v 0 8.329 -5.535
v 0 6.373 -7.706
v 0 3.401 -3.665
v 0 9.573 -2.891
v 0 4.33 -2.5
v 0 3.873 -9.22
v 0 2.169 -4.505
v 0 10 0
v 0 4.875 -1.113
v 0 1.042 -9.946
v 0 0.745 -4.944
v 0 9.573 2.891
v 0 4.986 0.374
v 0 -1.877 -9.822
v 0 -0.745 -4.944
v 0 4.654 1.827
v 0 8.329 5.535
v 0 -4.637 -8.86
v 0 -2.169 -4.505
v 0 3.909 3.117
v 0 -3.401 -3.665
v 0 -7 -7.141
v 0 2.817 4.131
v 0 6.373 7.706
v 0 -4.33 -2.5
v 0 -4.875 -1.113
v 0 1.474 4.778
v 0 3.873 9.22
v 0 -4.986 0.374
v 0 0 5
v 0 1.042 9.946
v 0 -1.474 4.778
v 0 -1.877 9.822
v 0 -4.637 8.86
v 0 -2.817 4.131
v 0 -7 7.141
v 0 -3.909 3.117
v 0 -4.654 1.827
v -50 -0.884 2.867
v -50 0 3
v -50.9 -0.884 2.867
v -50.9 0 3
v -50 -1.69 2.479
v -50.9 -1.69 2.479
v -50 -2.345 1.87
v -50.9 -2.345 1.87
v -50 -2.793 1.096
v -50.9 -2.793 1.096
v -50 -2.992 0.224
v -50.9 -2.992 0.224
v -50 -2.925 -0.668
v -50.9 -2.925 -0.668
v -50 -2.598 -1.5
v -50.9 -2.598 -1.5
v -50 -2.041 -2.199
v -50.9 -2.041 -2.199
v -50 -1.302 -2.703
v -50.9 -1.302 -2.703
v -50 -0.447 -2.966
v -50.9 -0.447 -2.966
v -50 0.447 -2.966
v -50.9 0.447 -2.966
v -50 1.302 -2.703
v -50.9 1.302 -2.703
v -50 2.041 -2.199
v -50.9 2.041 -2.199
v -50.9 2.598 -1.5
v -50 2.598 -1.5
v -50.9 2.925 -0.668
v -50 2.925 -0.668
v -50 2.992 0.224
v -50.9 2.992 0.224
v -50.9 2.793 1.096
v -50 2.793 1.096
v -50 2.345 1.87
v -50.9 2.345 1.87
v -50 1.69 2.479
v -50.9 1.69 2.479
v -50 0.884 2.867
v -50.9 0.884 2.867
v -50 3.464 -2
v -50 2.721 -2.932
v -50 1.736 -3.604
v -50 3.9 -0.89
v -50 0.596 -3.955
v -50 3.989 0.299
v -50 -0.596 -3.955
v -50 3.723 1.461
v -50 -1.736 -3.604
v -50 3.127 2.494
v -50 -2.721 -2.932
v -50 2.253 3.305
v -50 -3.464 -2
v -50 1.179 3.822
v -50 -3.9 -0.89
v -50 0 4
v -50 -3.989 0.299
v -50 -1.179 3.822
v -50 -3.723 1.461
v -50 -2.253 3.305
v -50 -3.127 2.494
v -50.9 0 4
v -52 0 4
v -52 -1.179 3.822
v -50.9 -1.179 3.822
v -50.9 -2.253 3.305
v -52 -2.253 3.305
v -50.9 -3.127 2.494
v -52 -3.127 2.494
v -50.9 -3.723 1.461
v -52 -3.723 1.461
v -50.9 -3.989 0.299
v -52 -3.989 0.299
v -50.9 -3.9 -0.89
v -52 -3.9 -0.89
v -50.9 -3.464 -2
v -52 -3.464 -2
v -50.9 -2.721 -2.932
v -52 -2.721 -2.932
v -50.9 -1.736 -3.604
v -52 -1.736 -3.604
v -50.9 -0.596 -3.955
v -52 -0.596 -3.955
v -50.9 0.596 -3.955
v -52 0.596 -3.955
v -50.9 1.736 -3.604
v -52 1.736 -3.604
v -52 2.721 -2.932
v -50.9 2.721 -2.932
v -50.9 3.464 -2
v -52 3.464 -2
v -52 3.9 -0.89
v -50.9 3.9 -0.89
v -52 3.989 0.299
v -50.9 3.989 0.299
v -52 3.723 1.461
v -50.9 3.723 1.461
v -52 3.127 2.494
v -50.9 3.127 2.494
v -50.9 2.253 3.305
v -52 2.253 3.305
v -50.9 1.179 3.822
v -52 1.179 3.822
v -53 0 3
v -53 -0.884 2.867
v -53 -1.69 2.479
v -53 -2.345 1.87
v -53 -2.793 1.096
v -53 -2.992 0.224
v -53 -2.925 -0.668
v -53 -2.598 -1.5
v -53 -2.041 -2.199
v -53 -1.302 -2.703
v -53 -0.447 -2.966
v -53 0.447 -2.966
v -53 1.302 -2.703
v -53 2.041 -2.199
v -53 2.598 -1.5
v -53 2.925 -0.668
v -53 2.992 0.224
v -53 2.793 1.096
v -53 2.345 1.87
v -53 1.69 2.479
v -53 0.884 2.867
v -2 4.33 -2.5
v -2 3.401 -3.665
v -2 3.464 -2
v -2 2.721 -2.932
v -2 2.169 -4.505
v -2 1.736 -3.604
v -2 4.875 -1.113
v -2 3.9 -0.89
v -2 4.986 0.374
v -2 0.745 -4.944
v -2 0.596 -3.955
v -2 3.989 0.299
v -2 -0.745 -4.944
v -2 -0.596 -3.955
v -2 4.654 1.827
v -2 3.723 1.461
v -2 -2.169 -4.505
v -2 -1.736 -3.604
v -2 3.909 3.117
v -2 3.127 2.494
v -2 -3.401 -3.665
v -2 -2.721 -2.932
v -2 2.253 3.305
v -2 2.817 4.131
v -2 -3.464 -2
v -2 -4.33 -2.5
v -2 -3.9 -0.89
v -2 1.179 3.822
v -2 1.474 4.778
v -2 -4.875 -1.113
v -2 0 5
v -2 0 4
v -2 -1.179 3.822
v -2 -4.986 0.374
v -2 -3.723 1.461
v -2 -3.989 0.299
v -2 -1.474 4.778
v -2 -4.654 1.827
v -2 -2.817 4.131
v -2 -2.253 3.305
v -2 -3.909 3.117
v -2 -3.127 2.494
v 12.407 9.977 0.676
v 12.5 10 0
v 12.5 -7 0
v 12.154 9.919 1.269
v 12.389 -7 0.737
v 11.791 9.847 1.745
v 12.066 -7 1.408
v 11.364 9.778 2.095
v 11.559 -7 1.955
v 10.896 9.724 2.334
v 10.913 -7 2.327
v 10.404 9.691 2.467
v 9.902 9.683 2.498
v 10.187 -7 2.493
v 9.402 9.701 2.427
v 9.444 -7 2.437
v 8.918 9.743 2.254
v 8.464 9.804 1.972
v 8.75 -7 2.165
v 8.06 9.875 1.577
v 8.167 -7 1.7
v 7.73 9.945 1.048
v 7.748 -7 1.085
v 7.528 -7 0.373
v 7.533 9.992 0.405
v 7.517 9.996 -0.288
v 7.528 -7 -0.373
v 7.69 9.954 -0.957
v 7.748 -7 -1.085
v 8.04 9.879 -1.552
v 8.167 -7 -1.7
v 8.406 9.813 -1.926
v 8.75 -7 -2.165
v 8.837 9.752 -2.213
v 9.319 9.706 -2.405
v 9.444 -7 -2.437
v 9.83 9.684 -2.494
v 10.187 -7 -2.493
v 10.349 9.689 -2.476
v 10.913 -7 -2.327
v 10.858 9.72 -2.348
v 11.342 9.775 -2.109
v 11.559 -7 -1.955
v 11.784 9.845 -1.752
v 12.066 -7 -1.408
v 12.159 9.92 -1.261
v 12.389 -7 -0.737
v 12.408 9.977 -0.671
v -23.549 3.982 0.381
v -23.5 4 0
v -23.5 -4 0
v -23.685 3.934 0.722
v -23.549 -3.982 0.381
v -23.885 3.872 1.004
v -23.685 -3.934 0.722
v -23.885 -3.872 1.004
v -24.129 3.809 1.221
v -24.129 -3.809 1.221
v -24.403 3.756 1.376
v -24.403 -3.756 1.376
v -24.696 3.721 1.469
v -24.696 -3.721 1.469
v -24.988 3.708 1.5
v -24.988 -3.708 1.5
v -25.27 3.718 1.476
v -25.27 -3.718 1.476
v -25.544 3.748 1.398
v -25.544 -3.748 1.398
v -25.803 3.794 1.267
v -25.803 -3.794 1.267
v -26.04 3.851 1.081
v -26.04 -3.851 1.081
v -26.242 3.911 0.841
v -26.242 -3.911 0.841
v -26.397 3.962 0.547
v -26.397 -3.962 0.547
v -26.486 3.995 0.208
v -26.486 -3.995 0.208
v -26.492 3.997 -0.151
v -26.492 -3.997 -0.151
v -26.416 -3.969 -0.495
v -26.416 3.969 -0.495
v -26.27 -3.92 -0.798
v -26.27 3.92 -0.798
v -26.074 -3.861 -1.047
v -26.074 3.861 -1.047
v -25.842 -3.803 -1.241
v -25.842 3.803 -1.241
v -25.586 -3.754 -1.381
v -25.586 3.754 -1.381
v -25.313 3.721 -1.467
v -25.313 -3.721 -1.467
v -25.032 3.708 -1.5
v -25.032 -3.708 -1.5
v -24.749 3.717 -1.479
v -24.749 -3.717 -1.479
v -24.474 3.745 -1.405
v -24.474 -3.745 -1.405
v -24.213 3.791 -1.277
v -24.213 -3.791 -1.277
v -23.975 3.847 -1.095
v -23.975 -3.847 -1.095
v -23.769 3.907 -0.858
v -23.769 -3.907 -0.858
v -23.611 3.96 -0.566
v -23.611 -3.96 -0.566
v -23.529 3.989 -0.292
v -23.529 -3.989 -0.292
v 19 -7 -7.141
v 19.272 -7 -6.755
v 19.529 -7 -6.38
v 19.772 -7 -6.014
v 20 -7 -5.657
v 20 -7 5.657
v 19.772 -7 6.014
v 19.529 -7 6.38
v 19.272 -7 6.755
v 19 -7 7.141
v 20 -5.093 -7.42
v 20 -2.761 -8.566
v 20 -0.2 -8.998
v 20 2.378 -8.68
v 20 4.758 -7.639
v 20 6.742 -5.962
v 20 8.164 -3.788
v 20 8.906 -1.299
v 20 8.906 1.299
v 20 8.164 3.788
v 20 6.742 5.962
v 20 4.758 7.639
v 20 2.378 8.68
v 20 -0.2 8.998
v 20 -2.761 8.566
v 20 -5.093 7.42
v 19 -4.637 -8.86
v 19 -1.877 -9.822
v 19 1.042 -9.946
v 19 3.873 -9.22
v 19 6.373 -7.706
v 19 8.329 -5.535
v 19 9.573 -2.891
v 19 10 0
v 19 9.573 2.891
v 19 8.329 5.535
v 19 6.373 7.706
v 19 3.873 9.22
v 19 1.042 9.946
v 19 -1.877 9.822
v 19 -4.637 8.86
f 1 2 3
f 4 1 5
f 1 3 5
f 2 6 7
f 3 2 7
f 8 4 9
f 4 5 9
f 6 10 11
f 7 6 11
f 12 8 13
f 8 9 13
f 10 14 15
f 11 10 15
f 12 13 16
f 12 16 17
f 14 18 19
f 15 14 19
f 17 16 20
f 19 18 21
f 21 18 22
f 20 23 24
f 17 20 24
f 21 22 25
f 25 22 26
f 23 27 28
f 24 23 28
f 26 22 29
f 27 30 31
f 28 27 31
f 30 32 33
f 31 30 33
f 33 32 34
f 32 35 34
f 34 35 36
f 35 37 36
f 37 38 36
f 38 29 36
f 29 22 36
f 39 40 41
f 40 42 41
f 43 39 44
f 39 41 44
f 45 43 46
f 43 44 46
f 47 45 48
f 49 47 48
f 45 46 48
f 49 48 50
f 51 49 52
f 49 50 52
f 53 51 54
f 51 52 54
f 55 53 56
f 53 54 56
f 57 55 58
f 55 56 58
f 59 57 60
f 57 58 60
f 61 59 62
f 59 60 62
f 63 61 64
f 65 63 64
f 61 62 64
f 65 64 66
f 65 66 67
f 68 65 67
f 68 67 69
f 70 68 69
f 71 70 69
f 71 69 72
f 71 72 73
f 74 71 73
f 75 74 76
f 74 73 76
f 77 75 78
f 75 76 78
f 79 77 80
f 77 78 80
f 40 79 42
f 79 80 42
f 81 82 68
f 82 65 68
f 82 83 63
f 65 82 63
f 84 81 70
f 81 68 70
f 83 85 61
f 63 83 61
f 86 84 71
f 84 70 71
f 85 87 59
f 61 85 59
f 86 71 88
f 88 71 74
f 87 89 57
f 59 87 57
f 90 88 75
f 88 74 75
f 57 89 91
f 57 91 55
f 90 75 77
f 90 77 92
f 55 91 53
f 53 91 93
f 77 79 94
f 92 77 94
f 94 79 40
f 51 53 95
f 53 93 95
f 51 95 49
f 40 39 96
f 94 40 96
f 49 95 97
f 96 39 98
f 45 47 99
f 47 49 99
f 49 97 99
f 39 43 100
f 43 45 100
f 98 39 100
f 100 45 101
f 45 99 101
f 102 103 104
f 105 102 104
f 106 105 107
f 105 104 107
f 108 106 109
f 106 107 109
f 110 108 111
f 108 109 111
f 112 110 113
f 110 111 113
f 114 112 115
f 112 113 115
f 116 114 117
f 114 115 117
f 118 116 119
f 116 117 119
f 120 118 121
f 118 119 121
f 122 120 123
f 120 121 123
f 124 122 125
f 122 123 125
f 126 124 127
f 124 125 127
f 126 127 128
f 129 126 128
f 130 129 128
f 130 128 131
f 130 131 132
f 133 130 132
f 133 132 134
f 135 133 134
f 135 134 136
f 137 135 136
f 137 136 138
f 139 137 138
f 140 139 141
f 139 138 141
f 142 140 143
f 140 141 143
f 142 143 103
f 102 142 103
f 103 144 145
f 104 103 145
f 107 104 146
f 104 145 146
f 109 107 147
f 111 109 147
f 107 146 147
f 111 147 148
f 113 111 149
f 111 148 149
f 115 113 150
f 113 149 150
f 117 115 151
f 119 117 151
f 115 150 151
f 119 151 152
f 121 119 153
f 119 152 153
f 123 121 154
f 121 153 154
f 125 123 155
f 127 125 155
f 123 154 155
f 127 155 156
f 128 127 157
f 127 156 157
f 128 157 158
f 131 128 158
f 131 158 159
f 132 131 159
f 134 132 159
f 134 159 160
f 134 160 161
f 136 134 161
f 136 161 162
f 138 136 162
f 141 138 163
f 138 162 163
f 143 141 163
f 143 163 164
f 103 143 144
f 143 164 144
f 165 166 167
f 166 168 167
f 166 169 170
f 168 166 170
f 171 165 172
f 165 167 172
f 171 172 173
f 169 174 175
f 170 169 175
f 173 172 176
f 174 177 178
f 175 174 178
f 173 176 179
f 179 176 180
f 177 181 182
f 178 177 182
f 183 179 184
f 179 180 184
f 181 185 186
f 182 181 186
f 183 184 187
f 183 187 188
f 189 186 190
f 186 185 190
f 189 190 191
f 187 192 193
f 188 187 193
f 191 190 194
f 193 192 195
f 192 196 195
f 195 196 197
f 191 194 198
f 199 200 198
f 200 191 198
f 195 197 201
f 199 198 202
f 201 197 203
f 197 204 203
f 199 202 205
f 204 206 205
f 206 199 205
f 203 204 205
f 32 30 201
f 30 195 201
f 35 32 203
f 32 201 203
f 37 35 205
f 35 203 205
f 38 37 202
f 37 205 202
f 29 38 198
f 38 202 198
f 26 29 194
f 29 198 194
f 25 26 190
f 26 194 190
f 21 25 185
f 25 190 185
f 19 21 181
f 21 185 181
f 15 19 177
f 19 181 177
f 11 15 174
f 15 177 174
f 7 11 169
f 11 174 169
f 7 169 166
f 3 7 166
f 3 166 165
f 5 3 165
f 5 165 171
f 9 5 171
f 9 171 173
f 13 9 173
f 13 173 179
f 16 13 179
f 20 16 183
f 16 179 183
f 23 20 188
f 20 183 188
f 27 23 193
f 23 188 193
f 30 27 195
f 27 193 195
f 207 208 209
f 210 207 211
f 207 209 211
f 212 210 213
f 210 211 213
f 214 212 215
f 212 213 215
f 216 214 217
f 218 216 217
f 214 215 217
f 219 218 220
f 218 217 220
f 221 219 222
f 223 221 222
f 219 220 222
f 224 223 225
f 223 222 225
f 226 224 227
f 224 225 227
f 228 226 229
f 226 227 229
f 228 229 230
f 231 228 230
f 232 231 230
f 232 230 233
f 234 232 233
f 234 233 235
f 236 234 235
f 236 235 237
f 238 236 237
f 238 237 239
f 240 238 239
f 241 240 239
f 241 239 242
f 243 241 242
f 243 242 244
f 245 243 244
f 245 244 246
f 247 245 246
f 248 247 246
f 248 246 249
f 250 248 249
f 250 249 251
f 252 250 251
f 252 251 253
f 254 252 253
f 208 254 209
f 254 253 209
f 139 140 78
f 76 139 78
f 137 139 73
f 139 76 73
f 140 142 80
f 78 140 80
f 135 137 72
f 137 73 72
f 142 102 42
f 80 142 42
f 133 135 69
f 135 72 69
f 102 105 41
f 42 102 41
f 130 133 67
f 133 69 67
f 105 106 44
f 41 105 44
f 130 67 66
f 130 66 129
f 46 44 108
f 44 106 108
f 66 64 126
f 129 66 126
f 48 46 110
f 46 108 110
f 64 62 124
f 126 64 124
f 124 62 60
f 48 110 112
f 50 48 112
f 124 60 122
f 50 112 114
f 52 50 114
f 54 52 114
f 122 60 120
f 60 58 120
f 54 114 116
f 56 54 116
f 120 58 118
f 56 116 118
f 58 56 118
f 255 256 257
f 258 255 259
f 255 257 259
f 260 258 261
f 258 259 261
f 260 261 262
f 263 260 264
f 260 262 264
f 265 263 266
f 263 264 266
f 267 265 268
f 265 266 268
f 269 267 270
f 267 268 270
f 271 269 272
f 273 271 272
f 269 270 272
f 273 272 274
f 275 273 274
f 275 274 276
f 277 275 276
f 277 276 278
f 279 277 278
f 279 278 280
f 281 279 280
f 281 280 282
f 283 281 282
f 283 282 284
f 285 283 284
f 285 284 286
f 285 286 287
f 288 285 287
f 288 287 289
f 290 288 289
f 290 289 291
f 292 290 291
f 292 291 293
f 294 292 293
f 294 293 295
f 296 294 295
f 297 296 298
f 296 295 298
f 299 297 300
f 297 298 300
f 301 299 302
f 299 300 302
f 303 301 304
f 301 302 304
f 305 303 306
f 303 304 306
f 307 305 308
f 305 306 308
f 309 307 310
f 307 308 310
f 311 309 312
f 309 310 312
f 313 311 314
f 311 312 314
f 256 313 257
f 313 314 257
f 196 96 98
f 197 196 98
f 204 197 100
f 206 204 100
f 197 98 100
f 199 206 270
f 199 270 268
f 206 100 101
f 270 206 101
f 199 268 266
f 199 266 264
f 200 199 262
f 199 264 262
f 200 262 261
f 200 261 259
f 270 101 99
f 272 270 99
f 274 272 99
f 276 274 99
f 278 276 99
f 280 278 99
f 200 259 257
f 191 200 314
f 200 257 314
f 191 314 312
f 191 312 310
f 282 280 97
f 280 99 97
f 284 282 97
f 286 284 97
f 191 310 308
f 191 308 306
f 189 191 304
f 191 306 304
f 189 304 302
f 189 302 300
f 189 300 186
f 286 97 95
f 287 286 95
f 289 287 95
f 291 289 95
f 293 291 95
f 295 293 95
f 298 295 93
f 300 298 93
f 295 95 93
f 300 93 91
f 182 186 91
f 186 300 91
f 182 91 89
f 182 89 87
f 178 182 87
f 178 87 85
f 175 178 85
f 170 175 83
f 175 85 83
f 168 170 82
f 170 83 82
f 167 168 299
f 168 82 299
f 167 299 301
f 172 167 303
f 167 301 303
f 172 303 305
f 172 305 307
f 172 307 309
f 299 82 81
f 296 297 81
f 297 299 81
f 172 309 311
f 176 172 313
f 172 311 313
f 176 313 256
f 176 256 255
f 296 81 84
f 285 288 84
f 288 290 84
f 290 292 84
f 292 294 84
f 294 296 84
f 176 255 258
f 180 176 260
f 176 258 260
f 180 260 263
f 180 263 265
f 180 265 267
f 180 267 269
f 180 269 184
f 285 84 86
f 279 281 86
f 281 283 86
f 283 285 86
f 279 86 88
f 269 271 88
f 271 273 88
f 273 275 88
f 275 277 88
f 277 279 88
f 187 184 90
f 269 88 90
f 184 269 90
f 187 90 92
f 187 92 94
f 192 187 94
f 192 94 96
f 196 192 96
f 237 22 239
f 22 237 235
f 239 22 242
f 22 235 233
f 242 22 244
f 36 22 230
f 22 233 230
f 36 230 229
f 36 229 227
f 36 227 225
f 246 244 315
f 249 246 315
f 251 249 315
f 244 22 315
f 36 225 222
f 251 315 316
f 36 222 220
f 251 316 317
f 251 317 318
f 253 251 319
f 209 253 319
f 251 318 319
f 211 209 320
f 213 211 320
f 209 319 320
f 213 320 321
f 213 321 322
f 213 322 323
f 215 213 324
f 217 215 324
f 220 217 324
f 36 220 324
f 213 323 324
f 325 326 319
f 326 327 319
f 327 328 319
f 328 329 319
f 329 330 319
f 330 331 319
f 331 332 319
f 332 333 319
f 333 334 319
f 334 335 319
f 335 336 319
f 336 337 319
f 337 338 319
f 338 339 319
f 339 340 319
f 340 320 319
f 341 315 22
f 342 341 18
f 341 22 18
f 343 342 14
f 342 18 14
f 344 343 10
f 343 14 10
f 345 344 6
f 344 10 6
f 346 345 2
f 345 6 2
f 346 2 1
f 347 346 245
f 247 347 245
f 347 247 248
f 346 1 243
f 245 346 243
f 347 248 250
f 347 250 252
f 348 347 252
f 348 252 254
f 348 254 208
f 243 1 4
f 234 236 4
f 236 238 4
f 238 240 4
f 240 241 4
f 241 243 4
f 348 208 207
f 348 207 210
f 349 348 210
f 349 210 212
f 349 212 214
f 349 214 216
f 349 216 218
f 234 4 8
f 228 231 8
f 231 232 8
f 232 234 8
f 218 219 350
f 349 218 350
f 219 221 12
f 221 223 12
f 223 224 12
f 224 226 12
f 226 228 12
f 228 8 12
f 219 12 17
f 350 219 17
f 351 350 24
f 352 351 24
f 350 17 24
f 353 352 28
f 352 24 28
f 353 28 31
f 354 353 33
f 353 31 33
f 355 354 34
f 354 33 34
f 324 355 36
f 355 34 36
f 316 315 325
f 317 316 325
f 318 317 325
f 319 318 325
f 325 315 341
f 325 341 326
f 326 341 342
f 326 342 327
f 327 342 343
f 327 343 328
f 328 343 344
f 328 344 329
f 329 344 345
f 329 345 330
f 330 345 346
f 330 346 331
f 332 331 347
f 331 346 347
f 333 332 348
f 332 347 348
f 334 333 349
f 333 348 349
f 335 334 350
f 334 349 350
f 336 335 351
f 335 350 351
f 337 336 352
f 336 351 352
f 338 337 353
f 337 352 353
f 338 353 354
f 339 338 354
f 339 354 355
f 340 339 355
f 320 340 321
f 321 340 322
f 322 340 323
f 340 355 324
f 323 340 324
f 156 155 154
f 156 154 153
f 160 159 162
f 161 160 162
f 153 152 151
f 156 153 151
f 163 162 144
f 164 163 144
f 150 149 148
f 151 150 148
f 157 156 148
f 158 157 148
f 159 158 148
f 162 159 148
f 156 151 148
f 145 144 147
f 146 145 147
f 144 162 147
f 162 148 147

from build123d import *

# Parameters (mm, degrees)
F2_SIZE  = 1
F4_DEPTH = 20
F5_R     = 2.5
F5_R_2   = 1.5
F6_DEPTH = 17.001


with BuildPart() as f1:
    # F0 (on Front) → F1 (revolve)
    with BuildSketch(Plane.XZ):
        Polygon((-53, 0), (0, 0), (20, 0), (20, 10), (0, 10), (0, 5), (-2, 5), (-2, 4), (-50, 4), (-50, 3), (-50.9, 3), (-50.9, 4), (-53, 4), align=None)
    revolve(axis=Axis((-15.901639617, 0, 0), (1, 0, 0)))

    # F2
    f2_edges = [f1.edges().sort_by_distance(p)[0] for p in [
        (-53, 0, -4),
        (20, 0, -10),
    ]]
    chamfer(f2_edges, length=F2_SIZE)

    # F3 (on face) → F4 (cut, through all)
    with BuildSketch(Plane.YZ.offset(20)):
        with BuildLine():
            Line((-7, -7.1414284285), (-7, 7.1414284285))
            ThreePointArc((-7, 7.1414284285), (-10, 0), (-7, -7.1414284285))
        make_face()
    extrude(amount=-F4_DEPTH, mode=Mode.SUBTRACT)

    # F5 (on face) → F6 (cut, through all)
    with BuildSketch(Plane.XZ.offset(7)):
        with Locations((10, 0)):
            Circle(F5_R)
        with Locations((-25, 0)):
            Circle(F5_R_2)
    extrude(amount=-F6_DEPTH, mode=Mode.SUBTRACT)


solid = f1.part
